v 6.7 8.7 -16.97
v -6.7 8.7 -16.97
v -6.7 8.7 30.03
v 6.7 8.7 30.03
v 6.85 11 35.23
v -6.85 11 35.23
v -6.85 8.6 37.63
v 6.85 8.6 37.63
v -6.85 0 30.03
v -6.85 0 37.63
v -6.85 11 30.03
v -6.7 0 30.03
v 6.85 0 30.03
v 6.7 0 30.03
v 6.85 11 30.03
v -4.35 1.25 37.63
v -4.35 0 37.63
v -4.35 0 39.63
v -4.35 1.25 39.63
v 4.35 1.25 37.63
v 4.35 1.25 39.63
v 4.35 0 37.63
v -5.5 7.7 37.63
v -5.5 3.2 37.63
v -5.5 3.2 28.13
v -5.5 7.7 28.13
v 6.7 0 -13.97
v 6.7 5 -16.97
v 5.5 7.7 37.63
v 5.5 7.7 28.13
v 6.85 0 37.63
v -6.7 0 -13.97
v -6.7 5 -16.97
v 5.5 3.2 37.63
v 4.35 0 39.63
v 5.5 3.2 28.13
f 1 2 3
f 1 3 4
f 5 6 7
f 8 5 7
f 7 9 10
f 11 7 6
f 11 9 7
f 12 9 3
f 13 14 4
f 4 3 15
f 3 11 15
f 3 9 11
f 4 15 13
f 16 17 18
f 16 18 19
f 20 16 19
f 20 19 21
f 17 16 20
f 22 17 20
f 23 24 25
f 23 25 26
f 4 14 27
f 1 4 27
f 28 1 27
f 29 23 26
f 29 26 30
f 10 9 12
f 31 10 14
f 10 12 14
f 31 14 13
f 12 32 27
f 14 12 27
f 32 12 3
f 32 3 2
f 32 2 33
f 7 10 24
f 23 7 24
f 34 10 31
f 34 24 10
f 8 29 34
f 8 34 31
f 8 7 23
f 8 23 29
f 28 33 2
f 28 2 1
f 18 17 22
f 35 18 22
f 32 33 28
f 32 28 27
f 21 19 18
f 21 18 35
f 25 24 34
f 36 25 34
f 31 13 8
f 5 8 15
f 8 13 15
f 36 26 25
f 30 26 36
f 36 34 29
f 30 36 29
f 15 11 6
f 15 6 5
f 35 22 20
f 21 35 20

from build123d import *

# Parameters (mm, degrees)
SKETCH1_W           = 13.4
SKETCH1_H           = 47
BOSS_EXTRUDE1_DEPTH = 8.7
CUT_EXTRUDE1_DEPTH  = 14.4
SKETCH3_W           = 13.7
SKETCH3_H           = 11
BOSS_EXTRUDE2_DEPTH = 7.6
CUT_EXTRUDE2_DEPTH  = 14.7
SKETCH5_W           = 8.7
SKETCH5_H           = 1.25
BOSS_EXTRUDE3_DEPTH = 2
SKETCH7_W           = 11
SKETCH7_H           = 4.5
CUT_EXTRUDE3_DEPTH  = 9.5


with BuildPart() as part:
    # Sketch1 → Boss-Extrude1 (new body)
    with BuildSketch(Plane(origin=(0, 0, 0), x_dir=(1, 0, 0), z_dir=(0, 1, 0))):
        with Locations((0, -6.529786546)):
            Rectangle(SKETCH1_W, SKETCH1_H)
    extrude(amount=BOSS_EXTRUDE1_DEPTH)

    # Sketch2 → Cut-Extrude1 (cut, through all)
    with BuildSketch(Plane.ZY.offset(6.7)):
        Polygon((-16.970213454, 0), (-16.970213454, 5), (-13.970213454, 0), align=None)
    extrude(amount=-CUT_EXTRUDE1_DEPTH, mode=Mode.SUBTRACT)

    # Sketch3 → Boss-Extrude2 (add)
    with BuildSketch(Plane.XY.offset(30.029786546)):
        with Locations((0, 5.5)):
            Rectangle(SKETCH3_W, SKETCH3_H)
    extrude(amount=BOSS_EXTRUDE2_DEPTH)

    # Sketch4 → Cut-Extrude2 (cut, through all)
    with BuildSketch(Plane.ZY.offset(6.85)):
        Polygon((37.629786546, 11), (35.229786546, 11), (37.629786546, 8.6), align=None)
    extrude(amount=-CUT_EXTRUDE2_DEPTH, mode=Mode.SUBTRACT)

    # Sketch7 → Cut-Extrude3 (cut)
    with BuildSketch(Plane.XY.offset(37.629786546)):
        with Locations((0, 5.45)):
            Rectangle(SKETCH7_W, SKETCH7_H)
    extrude(amount=-CUT_EXTRUDE3_DEPTH, mode=Mode.SUBTRACT)


with BuildPart() as body_2:
    # Sketch5 → Boss-Extrude3 (new body)
    with BuildSketch(Plane.XY.offset(37.629786546)):
        with Locations((0, 0.625)):
            Rectangle(SKETCH5_W, SKETCH5_H)
    extrude(amount=BOSS_EXTRUDE3_DEPTH)


solid = Compound([part.part, body_2.part])
